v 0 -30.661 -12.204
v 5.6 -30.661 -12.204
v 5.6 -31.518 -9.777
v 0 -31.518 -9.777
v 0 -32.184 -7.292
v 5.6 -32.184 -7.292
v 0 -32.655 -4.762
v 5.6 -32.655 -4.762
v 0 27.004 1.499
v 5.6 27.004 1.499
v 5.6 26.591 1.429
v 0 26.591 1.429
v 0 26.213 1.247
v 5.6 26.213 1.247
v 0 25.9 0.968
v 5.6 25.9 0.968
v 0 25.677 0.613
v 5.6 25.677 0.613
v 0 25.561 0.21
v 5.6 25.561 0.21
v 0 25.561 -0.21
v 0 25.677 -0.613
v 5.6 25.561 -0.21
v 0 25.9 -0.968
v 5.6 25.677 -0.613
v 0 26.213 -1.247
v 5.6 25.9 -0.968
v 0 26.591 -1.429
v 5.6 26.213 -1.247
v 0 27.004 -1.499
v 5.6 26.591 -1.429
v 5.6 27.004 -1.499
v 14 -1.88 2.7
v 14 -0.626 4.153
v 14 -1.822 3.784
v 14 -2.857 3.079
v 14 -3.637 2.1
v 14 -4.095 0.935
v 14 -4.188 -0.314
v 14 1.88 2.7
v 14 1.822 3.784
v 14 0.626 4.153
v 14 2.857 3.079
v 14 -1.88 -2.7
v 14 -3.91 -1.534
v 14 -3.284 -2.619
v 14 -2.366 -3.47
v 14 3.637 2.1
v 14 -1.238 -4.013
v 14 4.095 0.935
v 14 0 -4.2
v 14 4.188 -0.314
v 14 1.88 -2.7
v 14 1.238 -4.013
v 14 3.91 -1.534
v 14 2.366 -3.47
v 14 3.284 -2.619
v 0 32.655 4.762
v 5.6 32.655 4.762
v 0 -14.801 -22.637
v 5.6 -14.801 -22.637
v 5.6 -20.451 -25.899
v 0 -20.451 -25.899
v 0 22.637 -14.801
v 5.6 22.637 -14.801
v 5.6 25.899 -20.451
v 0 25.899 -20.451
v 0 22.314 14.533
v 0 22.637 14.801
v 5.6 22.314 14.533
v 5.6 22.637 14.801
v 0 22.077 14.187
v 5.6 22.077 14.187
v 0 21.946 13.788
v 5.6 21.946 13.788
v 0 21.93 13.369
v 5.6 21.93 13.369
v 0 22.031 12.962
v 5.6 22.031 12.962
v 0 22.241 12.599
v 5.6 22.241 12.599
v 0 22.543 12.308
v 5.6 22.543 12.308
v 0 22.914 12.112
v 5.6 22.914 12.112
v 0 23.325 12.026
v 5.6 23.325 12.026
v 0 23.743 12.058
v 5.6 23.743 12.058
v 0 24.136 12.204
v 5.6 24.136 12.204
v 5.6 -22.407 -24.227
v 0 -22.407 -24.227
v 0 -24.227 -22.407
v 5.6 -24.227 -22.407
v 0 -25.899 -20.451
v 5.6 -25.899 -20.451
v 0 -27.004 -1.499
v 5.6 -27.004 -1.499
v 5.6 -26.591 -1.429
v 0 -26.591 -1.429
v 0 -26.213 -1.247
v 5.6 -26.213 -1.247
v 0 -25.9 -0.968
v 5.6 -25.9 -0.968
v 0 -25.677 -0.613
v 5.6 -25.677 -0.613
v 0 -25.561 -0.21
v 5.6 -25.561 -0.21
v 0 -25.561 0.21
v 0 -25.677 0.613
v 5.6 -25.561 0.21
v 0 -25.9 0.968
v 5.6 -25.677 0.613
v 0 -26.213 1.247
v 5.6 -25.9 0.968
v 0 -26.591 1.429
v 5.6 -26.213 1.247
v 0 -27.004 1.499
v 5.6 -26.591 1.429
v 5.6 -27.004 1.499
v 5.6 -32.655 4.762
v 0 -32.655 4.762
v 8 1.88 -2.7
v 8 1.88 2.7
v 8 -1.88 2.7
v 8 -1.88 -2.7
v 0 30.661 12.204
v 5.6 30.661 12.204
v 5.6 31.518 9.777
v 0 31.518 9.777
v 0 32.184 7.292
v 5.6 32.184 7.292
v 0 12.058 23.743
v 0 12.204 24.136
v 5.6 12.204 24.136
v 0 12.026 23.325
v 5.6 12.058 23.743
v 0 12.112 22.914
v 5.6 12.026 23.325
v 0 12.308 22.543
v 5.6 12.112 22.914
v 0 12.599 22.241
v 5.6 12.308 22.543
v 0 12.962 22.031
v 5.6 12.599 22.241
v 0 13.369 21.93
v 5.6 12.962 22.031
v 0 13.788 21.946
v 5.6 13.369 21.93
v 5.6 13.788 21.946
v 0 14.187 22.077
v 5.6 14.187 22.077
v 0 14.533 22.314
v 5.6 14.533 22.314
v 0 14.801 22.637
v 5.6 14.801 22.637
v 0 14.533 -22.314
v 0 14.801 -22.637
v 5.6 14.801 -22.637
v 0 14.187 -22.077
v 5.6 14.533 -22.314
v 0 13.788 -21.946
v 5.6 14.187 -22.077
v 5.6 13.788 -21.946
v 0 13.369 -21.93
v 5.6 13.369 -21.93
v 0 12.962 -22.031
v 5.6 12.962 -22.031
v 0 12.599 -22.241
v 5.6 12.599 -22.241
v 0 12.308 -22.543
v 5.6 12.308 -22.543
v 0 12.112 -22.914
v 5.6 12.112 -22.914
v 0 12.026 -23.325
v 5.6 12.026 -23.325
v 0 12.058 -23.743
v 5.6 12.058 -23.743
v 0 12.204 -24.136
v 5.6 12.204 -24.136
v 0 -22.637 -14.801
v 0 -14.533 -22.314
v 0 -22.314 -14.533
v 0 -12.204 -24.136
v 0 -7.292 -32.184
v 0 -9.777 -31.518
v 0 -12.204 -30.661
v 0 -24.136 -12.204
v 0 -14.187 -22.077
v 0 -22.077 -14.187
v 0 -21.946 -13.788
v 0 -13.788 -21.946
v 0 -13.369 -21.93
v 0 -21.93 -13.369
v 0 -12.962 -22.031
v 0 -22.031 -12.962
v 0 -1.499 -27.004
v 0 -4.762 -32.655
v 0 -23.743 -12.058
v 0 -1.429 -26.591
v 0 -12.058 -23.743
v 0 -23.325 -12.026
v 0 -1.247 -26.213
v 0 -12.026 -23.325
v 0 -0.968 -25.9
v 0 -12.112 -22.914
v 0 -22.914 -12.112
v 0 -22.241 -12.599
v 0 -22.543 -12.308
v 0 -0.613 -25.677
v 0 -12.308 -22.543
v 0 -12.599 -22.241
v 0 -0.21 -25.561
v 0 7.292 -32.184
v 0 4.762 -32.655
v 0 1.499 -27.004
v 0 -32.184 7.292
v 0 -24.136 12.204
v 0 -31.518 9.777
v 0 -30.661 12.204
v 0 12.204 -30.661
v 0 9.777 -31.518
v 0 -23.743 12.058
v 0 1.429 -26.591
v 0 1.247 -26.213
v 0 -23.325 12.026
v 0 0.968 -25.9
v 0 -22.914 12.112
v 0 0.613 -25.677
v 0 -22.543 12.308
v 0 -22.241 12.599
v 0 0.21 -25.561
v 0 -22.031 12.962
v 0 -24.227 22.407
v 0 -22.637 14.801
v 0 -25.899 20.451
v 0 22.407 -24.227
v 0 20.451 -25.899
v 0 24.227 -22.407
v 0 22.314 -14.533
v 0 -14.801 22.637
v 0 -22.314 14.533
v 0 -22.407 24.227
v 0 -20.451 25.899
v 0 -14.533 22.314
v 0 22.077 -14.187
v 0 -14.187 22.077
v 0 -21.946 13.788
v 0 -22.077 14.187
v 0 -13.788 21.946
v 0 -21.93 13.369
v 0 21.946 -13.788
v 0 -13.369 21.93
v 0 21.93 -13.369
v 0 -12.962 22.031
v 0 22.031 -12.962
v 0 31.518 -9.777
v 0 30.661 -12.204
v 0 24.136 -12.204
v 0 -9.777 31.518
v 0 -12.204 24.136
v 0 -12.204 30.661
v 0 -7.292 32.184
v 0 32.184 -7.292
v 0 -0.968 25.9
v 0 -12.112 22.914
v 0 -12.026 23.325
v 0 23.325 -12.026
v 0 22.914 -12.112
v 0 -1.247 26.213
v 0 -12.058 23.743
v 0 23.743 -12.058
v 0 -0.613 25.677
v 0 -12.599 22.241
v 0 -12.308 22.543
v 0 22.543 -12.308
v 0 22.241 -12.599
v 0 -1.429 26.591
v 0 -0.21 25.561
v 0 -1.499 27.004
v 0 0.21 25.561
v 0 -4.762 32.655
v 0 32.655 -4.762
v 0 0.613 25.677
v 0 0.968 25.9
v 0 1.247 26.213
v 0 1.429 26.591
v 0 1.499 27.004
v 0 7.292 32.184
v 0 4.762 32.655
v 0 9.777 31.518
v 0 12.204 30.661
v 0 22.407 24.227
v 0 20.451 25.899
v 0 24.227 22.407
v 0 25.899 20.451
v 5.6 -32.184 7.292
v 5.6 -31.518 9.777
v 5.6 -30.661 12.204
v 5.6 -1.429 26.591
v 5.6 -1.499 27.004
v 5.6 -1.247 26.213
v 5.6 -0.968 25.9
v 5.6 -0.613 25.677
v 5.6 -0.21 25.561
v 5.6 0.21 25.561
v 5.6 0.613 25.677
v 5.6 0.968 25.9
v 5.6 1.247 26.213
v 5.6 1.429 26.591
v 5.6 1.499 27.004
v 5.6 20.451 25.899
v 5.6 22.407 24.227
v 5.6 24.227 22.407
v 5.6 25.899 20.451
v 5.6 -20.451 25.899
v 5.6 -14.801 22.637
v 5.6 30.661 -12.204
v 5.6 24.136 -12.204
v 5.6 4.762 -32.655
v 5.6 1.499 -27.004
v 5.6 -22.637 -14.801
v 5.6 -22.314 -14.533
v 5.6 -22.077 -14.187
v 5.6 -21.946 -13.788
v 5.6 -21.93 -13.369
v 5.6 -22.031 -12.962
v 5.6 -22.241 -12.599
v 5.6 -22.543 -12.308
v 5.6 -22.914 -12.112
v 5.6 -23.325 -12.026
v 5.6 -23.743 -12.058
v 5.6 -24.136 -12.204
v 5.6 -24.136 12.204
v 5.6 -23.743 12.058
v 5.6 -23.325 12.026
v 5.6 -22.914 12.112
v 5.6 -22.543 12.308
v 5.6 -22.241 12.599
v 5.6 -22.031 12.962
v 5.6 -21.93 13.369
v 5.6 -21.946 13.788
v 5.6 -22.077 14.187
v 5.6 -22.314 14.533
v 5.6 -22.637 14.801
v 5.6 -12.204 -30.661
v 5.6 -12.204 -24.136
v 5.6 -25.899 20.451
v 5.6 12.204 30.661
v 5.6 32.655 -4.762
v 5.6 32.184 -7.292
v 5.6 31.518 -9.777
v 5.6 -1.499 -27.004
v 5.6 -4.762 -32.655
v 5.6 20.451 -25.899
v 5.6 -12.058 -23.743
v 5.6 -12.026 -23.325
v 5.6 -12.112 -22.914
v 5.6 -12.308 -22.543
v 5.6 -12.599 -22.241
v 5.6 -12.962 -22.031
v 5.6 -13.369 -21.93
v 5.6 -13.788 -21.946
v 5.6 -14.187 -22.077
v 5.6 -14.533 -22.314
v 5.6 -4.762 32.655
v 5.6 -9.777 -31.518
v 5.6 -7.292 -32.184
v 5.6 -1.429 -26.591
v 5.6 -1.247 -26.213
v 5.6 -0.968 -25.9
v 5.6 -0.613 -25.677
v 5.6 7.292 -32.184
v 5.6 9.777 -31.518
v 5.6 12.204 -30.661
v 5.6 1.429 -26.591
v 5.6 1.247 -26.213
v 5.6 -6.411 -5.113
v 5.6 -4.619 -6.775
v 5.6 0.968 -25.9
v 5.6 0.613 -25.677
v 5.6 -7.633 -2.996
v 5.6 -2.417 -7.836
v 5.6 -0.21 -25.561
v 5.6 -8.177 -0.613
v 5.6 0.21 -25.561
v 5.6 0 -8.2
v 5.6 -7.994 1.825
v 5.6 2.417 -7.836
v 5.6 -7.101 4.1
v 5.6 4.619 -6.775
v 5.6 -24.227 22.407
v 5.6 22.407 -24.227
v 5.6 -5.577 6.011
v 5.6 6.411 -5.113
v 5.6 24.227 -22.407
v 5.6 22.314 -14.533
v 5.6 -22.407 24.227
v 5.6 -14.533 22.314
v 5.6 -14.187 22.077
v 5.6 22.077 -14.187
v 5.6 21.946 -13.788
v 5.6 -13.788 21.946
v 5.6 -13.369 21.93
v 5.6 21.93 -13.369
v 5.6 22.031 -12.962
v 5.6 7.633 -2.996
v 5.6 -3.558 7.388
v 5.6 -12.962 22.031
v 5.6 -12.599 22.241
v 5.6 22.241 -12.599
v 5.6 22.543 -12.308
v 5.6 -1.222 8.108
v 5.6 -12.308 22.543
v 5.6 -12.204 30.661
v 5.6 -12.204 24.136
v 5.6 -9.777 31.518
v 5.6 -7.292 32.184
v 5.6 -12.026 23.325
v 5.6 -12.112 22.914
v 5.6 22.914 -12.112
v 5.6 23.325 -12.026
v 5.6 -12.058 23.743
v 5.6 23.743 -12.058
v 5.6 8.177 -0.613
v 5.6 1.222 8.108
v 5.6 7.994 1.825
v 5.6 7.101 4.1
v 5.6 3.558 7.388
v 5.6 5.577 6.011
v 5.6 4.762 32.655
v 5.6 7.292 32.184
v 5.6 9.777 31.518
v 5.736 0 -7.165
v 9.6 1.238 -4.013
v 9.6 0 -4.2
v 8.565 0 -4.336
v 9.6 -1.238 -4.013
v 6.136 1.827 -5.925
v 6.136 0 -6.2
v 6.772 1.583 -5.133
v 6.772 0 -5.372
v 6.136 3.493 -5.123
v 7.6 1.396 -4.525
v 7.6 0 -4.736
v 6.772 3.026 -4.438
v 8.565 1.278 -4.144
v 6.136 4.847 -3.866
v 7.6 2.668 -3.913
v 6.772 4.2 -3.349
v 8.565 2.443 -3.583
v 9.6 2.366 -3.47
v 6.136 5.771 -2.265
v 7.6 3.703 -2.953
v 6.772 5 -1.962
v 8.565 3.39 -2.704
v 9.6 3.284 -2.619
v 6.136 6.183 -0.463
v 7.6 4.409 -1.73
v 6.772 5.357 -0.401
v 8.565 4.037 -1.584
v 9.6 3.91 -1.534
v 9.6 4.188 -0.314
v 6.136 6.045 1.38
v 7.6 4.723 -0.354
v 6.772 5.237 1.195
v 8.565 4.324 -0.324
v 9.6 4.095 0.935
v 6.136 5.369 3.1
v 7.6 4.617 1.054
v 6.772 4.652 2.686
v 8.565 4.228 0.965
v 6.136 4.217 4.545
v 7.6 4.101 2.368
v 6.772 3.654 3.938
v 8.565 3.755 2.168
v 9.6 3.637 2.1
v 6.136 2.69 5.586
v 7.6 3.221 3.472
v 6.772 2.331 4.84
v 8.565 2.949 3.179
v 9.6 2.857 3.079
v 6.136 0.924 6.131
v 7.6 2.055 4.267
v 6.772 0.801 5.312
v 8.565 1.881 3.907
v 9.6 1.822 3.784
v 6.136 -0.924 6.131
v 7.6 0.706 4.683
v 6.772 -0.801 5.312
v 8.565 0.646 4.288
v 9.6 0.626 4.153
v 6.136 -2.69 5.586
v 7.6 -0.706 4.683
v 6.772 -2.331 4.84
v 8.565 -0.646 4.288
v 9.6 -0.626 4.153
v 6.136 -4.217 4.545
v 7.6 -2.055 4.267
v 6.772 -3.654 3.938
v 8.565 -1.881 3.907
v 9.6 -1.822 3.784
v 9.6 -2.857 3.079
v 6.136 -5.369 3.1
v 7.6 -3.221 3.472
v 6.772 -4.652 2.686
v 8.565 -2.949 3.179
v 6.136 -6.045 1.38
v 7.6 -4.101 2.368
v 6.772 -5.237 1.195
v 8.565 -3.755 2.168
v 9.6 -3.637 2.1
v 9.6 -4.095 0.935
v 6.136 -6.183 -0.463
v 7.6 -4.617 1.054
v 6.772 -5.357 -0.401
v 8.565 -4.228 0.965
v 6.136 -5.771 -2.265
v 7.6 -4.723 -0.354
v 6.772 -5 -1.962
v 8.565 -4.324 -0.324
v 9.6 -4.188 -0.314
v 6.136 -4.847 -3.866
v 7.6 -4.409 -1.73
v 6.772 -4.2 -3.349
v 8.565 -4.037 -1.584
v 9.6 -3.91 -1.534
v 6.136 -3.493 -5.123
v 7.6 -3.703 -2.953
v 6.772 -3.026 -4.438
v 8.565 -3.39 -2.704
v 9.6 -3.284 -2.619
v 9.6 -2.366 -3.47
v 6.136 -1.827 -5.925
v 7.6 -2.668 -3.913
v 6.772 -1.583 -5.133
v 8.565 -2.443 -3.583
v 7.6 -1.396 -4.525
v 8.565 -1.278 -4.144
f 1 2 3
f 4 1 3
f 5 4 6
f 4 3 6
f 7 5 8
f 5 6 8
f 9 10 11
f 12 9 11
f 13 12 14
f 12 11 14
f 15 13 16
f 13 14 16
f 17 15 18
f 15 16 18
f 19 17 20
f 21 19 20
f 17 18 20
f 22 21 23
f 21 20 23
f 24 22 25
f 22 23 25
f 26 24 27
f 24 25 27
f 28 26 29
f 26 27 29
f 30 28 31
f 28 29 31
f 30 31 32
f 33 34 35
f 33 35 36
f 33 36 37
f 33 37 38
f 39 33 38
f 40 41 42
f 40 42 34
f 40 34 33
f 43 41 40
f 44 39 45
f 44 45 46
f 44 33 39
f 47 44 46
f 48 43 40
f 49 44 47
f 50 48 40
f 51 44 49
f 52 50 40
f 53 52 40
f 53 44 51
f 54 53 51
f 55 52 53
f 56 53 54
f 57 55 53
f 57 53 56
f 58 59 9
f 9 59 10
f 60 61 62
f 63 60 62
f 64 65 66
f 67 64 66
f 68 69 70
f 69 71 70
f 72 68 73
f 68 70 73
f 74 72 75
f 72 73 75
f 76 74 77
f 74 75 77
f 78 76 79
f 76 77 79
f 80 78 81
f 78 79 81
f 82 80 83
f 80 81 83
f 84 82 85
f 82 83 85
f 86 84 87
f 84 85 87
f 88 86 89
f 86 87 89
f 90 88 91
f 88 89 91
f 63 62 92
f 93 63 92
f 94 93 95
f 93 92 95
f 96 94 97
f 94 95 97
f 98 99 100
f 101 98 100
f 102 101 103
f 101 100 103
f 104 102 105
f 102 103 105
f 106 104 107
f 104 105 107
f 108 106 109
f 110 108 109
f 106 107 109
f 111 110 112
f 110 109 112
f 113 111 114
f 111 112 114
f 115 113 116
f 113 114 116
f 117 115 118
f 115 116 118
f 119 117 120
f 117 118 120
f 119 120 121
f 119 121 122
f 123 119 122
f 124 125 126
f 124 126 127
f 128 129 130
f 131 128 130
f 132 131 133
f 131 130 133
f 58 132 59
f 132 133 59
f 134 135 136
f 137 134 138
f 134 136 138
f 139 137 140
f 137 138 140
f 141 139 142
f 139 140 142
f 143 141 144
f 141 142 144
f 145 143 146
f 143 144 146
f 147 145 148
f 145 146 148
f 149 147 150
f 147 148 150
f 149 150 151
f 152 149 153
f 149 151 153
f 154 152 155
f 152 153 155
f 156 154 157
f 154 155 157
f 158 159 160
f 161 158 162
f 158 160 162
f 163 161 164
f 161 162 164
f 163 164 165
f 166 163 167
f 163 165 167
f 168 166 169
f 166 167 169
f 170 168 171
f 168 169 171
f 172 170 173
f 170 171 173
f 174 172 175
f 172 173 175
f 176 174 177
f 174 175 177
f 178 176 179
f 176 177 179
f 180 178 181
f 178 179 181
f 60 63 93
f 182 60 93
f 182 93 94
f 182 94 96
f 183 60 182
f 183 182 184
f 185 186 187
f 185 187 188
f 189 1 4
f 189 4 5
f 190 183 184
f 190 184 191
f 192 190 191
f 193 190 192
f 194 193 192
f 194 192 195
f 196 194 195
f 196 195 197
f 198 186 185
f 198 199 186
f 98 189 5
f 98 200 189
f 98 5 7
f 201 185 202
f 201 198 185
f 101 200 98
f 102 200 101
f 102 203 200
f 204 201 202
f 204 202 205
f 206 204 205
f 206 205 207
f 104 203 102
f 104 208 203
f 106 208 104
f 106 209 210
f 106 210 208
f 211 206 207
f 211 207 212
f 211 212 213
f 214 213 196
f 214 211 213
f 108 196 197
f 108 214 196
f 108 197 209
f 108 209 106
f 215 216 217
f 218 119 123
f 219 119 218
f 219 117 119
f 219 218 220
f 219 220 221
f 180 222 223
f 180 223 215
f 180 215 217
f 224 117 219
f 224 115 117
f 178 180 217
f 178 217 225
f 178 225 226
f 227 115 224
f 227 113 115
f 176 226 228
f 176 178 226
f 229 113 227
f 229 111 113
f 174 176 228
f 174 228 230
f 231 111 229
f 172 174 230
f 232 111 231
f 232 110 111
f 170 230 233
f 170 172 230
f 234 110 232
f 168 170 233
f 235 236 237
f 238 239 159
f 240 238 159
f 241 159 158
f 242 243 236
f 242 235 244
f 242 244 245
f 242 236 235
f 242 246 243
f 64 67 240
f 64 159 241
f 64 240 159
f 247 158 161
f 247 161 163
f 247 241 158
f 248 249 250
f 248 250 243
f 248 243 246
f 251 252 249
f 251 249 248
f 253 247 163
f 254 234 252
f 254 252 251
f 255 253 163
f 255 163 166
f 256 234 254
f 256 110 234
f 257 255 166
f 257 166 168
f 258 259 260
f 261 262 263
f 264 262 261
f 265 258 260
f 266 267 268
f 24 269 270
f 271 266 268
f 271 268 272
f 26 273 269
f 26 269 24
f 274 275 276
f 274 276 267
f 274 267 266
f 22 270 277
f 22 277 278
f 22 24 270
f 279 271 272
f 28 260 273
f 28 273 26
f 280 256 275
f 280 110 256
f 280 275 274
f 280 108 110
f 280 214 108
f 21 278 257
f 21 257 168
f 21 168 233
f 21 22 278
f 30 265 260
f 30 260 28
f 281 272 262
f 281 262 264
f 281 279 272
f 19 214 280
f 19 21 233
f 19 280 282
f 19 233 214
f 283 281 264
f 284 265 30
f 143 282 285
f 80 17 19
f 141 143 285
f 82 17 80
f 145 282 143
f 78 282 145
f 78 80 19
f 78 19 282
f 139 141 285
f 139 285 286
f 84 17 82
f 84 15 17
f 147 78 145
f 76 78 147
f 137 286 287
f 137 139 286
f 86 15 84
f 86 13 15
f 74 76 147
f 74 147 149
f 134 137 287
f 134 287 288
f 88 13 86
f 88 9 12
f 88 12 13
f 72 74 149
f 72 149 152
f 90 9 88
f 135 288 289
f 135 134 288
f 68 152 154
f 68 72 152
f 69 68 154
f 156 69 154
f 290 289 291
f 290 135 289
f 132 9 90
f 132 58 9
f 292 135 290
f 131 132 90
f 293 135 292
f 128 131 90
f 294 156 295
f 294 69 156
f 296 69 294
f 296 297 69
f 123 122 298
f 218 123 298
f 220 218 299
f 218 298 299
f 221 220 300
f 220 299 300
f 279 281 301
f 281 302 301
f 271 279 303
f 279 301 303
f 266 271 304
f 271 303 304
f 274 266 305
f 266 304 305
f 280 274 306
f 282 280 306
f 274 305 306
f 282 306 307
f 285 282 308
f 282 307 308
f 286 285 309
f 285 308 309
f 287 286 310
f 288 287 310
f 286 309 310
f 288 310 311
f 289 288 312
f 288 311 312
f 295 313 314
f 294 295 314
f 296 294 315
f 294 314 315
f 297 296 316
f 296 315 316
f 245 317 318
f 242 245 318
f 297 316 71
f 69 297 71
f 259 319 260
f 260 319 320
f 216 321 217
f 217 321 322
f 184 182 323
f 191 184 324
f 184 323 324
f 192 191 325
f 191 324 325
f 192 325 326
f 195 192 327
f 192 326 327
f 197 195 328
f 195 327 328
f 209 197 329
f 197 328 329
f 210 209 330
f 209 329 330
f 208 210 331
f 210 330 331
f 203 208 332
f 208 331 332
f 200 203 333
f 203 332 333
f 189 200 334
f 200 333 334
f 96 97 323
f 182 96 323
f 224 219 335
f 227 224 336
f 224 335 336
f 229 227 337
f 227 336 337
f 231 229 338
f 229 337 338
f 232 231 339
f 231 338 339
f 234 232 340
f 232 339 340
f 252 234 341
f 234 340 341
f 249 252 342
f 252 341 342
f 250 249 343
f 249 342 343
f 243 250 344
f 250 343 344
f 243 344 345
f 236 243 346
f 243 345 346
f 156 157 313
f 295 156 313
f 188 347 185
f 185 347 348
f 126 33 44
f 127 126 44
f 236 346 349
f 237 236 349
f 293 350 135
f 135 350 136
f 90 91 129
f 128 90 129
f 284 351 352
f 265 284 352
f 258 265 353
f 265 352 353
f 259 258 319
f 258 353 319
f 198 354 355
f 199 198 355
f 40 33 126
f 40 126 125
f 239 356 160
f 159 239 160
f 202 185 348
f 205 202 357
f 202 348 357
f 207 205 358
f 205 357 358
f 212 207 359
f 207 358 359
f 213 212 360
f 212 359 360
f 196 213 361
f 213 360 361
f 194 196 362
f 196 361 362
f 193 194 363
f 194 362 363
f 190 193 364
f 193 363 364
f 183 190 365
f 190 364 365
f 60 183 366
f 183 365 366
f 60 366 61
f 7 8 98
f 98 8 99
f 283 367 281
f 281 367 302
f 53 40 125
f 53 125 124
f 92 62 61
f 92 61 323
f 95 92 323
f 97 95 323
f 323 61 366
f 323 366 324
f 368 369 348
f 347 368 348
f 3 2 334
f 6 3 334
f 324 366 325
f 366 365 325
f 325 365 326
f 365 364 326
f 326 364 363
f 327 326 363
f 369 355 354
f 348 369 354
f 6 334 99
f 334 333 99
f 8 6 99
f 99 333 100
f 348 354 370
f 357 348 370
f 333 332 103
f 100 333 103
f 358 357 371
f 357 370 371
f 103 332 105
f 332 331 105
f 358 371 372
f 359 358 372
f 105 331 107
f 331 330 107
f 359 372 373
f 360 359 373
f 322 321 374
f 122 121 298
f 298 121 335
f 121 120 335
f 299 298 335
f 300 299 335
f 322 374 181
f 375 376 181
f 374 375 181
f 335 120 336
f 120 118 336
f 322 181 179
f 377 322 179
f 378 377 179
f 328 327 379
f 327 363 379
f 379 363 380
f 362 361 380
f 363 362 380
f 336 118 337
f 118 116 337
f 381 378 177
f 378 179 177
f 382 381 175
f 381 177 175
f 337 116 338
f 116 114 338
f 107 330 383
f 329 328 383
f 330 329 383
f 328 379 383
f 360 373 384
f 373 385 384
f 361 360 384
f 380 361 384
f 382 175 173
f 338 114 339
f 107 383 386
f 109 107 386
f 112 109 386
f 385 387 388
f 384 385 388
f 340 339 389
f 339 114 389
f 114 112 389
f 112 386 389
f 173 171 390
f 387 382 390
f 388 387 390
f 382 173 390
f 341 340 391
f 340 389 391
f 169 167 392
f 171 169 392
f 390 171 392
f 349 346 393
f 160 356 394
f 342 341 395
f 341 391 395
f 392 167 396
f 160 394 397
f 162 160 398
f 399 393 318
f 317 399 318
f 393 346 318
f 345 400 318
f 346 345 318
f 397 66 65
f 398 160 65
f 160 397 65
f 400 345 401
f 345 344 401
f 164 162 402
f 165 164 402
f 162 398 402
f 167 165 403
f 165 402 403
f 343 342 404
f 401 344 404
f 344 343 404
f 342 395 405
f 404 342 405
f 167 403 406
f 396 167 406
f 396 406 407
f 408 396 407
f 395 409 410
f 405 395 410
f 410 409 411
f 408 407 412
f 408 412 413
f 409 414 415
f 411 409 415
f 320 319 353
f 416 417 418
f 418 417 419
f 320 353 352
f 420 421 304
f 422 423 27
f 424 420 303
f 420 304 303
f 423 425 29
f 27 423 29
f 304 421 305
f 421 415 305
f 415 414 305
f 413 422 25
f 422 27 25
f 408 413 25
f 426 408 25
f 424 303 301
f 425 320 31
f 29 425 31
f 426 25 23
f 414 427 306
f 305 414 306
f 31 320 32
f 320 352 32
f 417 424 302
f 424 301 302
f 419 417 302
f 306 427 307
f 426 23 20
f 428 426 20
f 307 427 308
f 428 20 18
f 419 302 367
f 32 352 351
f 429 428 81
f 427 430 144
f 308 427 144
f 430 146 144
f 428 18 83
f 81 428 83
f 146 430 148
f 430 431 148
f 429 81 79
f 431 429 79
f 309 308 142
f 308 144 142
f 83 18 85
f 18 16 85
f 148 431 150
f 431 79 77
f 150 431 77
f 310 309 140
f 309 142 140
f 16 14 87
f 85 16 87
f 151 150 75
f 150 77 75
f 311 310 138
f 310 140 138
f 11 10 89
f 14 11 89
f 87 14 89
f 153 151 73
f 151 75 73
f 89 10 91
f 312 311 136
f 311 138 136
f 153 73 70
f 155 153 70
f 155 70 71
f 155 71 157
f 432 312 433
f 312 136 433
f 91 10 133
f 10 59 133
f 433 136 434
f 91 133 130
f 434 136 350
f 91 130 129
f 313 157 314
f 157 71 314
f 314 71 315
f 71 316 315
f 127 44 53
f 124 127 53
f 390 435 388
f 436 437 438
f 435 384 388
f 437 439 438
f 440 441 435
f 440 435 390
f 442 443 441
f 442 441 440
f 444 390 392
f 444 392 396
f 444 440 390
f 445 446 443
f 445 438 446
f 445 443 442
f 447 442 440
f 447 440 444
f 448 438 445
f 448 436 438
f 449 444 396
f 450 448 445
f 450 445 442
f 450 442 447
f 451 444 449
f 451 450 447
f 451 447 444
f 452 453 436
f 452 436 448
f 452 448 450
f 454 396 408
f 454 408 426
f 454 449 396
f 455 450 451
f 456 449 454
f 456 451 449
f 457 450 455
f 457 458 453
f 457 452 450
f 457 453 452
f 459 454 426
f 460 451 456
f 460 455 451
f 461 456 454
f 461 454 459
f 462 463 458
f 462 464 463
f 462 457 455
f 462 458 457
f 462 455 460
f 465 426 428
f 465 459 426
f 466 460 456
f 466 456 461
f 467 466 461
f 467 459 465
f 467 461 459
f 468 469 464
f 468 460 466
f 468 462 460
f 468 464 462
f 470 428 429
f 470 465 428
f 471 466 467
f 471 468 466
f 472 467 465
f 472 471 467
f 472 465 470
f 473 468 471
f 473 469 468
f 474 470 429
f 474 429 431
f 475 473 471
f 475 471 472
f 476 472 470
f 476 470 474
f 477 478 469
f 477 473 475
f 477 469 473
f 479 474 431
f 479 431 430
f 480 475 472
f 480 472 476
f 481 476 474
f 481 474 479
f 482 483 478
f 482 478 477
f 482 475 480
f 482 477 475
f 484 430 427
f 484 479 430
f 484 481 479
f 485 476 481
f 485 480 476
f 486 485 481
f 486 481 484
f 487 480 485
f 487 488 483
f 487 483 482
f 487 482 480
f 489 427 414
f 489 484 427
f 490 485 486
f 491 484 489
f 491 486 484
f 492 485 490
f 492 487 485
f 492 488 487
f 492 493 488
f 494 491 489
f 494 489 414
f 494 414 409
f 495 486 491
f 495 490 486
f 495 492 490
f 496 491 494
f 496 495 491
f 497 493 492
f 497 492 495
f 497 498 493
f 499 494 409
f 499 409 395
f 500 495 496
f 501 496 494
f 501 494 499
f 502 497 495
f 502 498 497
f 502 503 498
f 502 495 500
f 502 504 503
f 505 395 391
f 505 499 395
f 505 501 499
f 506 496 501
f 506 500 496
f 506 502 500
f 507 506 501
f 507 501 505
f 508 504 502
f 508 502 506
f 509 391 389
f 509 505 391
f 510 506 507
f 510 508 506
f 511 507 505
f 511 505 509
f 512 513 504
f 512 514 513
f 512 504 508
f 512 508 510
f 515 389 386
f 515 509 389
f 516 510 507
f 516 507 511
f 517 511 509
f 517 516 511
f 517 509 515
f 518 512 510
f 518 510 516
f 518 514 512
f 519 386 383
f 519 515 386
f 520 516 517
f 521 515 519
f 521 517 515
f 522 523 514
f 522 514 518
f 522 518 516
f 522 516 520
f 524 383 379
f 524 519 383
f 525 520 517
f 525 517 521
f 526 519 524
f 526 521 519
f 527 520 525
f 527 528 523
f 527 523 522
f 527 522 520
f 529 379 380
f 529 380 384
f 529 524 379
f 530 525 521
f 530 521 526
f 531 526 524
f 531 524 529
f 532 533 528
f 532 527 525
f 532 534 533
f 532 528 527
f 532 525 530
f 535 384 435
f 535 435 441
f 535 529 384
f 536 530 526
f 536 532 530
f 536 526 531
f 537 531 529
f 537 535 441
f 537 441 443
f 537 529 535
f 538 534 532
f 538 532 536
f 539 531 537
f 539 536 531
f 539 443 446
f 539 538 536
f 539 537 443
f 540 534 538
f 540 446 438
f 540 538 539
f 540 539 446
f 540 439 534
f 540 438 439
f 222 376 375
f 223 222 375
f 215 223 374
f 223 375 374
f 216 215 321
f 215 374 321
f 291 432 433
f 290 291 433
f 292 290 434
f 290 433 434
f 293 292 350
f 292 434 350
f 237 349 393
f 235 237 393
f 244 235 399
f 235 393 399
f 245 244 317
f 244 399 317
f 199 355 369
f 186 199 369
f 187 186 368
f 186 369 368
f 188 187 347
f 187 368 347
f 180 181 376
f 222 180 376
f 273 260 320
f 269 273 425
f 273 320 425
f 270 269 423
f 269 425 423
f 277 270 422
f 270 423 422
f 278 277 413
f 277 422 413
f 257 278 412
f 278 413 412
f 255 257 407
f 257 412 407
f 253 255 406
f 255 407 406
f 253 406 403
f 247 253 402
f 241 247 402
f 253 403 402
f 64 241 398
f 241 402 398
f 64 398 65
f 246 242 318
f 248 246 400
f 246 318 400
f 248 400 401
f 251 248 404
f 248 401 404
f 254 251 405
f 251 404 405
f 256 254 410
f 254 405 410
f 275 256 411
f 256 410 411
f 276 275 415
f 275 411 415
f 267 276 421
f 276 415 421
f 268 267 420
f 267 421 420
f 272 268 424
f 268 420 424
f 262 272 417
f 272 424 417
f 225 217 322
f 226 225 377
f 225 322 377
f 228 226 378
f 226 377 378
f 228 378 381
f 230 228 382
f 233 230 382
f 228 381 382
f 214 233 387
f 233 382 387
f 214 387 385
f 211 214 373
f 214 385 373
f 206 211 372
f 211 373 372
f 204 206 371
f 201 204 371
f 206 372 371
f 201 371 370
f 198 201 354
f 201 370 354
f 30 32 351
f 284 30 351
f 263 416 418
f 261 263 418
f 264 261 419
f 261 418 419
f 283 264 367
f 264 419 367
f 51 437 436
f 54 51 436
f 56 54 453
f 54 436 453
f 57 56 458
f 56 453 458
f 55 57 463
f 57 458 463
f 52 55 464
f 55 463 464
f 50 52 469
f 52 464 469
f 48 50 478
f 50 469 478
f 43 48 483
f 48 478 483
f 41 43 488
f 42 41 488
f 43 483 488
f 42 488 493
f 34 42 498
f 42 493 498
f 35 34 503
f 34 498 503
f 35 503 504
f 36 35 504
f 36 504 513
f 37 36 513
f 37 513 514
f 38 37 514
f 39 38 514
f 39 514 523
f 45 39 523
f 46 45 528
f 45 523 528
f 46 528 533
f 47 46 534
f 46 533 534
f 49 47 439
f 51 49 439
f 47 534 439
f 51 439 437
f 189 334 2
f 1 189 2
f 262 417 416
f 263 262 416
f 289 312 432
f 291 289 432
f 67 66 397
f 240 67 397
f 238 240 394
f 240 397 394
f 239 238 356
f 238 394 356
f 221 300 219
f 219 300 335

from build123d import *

# Parameters (mm, degrees)
SKETCH3_R           = 27.045923136
BOSS_EXTRUDE1_DEPTH = 5.6
SKETCH4_R           = 1.5
CUT_EXTRUDE1_DEPTH  = 6.6
BOSS_EXTRUDE3_DEPTH = 5.6
SKETCH6_R           = 4.2
BOSS_EXTRUDE4_DEPTH = 8.4
SKETCH7_W           = 5.4
SKETCH7_H           = 3.76
CUT_EXTRUDE2_DEPTH  = 6
FILLET1_R           = 4


with BuildPart() as part:
    # Sketch3 → Boss-Extrude1 (new body)
    with BuildSketch(Plane(origin=(0, 0, 0), x_dir=(0, 0, -1), z_dir=(1, 0, 0))):
        Circle(SKETCH3_R)
    extrude(amount=BOSS_EXTRUDE1_DEPTH)

    # Sketch4 → Cut-Extrude1 (cut, through all)
    with BuildSketch(Plane(origin=(5.6, 0, 0), x_dir=(0, 0, -1), z_dir=(1, 0, 0))):
        with Locations((0, 27.045923136)):
            Circle(SKETCH4_R)
        with Locations((13.522961568, 23.422456505)):
            Circle(SKETCH4_R)
        with Locations((23.422456505, 13.522961568)):
            Circle(SKETCH4_R)
        with Locations((27.045923136, 0)):
            Circle(SKETCH4_R)
        with Locations((23.422456505, -13.522961568)):
            Circle(SKETCH4_R)
        with Locations((13.522961568, -23.422456505)):
            Circle(SKETCH4_R)
        with Locations((0, -27.045923136)):
            Circle(SKETCH4_R)
        with Locations((-13.522961568, -23.422456505)):
            Circle(SKETCH4_R)
        with Locations((-23.422456505, -13.522961568)):
            Circle(SKETCH4_R)
        with Locations((-27.045923136, 0)):
            Circle(SKETCH4_R)
        with Locations((-23.422456505, 13.522961568)):
            Circle(SKETCH4_R)
        with Locations((-13.522961568, 23.422456505)):
            Circle(SKETCH4_R)
    extrude(amount=-CUT_EXTRUDE1_DEPTH, mode=Mode.SUBTRACT)

    # Sketch5 → Boss-Extrude3 (add)
    with BuildSketch(Plane(origin=(5.6, 0, 0), x_dir=(0, 0, -1), z_dir=(1, 0, 0))):
        with BuildLine():
            Line((1.499423149, 27.004327218), (4.76164368, 32.654658924))
            ThreePointArc((4.76164368, 32.654658924), (8.541028488, 31.875552268), (12.203625071, 30.660586021))
            Line((12.203625071, 30.660586021), (12.203625071, 24.136144957))
            Line((12.203625071, 24.136144957), (2.679491924, 10))
            Line((2.679491924, 10), (1.499423149, 27.004327218))
        make_face()
        with BuildLine():
            Line((22.636721809, 14.800702147), (7.320508076, 7.320508076))
            Line((7.320508076, 7.320508076), (14.800702147, 22.636721809))
            Line((14.800702147, 22.636721809), (20.451033853, 25.89894234))
            ThreePointArc((20.451033853, 25.89894234), (23.334523779, 23.334523779), (25.89894234, 20.451033853))
            Line((25.89894234, 20.451033853), (22.636721809, 14.800702147))
        make_face()
        with BuildLine():
            Line((27.004327218, 1.499423149), (10, 2.679491924))
            Line((10, 2.679491924), (24.136144957, 12.203625071))
            Line((24.136144957, 12.203625071), (30.660586021, 12.203625071))
            ThreePointArc((30.660586021, 12.203625071), (31.875552268, 8.541028488), (32.654658924, 4.76164368))
            Line((32.654658924, 4.76164368), (27.004327218, 1.499423149))
        make_face()
        with BuildLine():
            Line((24.136144957, -12.203625071), (10, -2.679491924))
            Line((10, -2.679491924), (27.004327218, -1.499423149))
            Line((27.004327218, -1.499423149), (32.654658924, -4.76164368))
            ThreePointArc((32.654658924, -4.76164368), (31.875552268, -8.541028488), (30.660586021, -12.203625071))
            Line((30.660586021, -12.203625071), (24.136144957, -12.203625071))
        make_face()
        with BuildLine():
            Line((14.800702147, -22.636721809), (7.320508076, -7.320508076))
            Line((7.320508076, -7.320508076), (22.636721809, -14.800702147))
            Line((22.636721809, -14.800702147), (25.89894234, -20.451033853))
            ThreePointArc((25.89894234, -20.451033853), (23.334523779, -23.334523779), (20.451033853, -25.89894234))
            Line((20.451033853, -25.89894234), (14.800702147, -22.636721809))
        make_face()
        with BuildLine():
            Line((1.499423149, -27.004327218), (2.679491924, -10))
            Line((2.679491924, -10), (12.203625071, -24.136144957))
            Line((12.203625071, -24.136144957), (12.203625071, -30.660586021))
            ThreePointArc((12.203625071, -30.660586021), (8.541028488, -31.875552268), (4.76164368, -32.654658924))
            Line((4.76164368, -32.654658924), (1.499423149, -27.004327218))
        make_face()
        with BuildLine():
            Line((-12.203625071, -24.136144957), (-2.679491924, -10))
            Line((-2.679491924, -10), (-1.499423149, -27.004327218))
            Line((-1.499423149, -27.004327218), (-4.76164368, -32.654658924))
            ThreePointArc((-4.76164368, -32.654658924), (-8.541028488, -31.875552268), (-12.203625071, -30.660586021))
            Line((-12.203625071, -30.660586021), (-12.203625071, -24.136144957))
        make_face()
        with BuildLine():
            Line((-22.636721809, -14.800702147), (-7.320508076, -7.320508076))
            Line((-7.320508076, -7.320508076), (-14.800702147, -22.636721809))
            Line((-14.800702147, -22.636721809), (-20.451033853, -25.89894234))
            ThreePointArc((-20.451033853, -25.89894234), (-23.334523779, -23.334523779), (-25.89894234, -20.451033853))
            Line((-25.89894234, -20.451033853), (-22.636721809, -14.800702147))
        make_face()
        with BuildLine():
            Line((-27.004327218, -1.499423149), (-10, -2.679491924))
            Line((-10, -2.679491924), (-24.136144957, -12.203625071))
            Line((-24.136144957, -12.203625071), (-30.660586021, -12.203625071))
            ThreePointArc((-30.660586021, -12.203625071), (-31.875552268, -8.541028488), (-32.654658924, -4.76164368))
            Line((-32.654658924, -4.76164368), (-27.004327218, -1.499423149))
        make_face()
        with BuildLine():
            Line((-24.136144957, 12.203625071), (-10, 2.679491924))
            Line((-10, 2.679491924), (-27.004327218, 1.499423149))
            Line((-27.004327218, 1.499423149), (-32.654658924, 4.76164368))
            ThreePointArc((-32.654658924, 4.76164368), (-31.875552268, 8.541028488), (-30.660586021, 12.203625071))
            Line((-30.660586021, 12.203625071), (-24.136144957, 12.203625071))
        make_face()
        with BuildLine():
            Line((-14.800702147, 22.636721809), (-7.320508076, 7.320508076))
            Line((-7.320508076, 7.320508076), (-22.636721809, 14.800702147))
            Line((-22.636721809, 14.800702147), (-25.89894234, 20.451033853))
            ThreePointArc((-25.89894234, 20.451033853), (-23.334523779, 23.334523779), (-20.451033853, 25.89894234))
            Line((-20.451033853, 25.89894234), (-14.800702147, 22.636721809))
        make_face()
        with BuildLine():
            Line((-1.499423149, 27.004327218), (-2.679491924, 10))
            Line((-2.679491924, 10), (-12.203625071, 24.136144957))
            Line((-12.203625071, 24.136144957), (-12.203625071, 30.660586021))
            ThreePointArc((-12.203625071, 30.660586021), (-8.541028488, 31.875552268), (-4.76164368, 32.654658924))
            Line((-4.76164368, 32.654658924), (-1.499423149, 27.004327218))
        make_face()
    extrude(amount=-BOSS_EXTRUDE3_DEPTH)

    # Sketch6 → Boss-Extrude4 (add)
    with BuildSketch(Plane(origin=(5.6, 0, 0), x_dir=(0, 0, -1), z_dir=(1, 0, 0))):
        Circle(SKETCH6_R)
    extrude(amount=BOSS_EXTRUDE4_DEPTH)

    # Sketch7 → Cut-Extrude2 (cut)
    with BuildSketch(Plane(origin=(14, 0, 0), x_dir=(0, 0, -1), z_dir=(1, 0, 0))):
        Rectangle(SKETCH7_W, SKETCH7_H)
    extrude(amount=-CUT_EXTRUDE2_DEPTH, mode=Mode.SUBTRACT)

    # Fillet1
    fillet1_edges = [part.edges().sort_by_distance(p)[0] for p in [
        (5.6, 0, 4.2),
    ]]
    fillet(fillet1_edges, radius=FILLET1_R)


solid = part.part
